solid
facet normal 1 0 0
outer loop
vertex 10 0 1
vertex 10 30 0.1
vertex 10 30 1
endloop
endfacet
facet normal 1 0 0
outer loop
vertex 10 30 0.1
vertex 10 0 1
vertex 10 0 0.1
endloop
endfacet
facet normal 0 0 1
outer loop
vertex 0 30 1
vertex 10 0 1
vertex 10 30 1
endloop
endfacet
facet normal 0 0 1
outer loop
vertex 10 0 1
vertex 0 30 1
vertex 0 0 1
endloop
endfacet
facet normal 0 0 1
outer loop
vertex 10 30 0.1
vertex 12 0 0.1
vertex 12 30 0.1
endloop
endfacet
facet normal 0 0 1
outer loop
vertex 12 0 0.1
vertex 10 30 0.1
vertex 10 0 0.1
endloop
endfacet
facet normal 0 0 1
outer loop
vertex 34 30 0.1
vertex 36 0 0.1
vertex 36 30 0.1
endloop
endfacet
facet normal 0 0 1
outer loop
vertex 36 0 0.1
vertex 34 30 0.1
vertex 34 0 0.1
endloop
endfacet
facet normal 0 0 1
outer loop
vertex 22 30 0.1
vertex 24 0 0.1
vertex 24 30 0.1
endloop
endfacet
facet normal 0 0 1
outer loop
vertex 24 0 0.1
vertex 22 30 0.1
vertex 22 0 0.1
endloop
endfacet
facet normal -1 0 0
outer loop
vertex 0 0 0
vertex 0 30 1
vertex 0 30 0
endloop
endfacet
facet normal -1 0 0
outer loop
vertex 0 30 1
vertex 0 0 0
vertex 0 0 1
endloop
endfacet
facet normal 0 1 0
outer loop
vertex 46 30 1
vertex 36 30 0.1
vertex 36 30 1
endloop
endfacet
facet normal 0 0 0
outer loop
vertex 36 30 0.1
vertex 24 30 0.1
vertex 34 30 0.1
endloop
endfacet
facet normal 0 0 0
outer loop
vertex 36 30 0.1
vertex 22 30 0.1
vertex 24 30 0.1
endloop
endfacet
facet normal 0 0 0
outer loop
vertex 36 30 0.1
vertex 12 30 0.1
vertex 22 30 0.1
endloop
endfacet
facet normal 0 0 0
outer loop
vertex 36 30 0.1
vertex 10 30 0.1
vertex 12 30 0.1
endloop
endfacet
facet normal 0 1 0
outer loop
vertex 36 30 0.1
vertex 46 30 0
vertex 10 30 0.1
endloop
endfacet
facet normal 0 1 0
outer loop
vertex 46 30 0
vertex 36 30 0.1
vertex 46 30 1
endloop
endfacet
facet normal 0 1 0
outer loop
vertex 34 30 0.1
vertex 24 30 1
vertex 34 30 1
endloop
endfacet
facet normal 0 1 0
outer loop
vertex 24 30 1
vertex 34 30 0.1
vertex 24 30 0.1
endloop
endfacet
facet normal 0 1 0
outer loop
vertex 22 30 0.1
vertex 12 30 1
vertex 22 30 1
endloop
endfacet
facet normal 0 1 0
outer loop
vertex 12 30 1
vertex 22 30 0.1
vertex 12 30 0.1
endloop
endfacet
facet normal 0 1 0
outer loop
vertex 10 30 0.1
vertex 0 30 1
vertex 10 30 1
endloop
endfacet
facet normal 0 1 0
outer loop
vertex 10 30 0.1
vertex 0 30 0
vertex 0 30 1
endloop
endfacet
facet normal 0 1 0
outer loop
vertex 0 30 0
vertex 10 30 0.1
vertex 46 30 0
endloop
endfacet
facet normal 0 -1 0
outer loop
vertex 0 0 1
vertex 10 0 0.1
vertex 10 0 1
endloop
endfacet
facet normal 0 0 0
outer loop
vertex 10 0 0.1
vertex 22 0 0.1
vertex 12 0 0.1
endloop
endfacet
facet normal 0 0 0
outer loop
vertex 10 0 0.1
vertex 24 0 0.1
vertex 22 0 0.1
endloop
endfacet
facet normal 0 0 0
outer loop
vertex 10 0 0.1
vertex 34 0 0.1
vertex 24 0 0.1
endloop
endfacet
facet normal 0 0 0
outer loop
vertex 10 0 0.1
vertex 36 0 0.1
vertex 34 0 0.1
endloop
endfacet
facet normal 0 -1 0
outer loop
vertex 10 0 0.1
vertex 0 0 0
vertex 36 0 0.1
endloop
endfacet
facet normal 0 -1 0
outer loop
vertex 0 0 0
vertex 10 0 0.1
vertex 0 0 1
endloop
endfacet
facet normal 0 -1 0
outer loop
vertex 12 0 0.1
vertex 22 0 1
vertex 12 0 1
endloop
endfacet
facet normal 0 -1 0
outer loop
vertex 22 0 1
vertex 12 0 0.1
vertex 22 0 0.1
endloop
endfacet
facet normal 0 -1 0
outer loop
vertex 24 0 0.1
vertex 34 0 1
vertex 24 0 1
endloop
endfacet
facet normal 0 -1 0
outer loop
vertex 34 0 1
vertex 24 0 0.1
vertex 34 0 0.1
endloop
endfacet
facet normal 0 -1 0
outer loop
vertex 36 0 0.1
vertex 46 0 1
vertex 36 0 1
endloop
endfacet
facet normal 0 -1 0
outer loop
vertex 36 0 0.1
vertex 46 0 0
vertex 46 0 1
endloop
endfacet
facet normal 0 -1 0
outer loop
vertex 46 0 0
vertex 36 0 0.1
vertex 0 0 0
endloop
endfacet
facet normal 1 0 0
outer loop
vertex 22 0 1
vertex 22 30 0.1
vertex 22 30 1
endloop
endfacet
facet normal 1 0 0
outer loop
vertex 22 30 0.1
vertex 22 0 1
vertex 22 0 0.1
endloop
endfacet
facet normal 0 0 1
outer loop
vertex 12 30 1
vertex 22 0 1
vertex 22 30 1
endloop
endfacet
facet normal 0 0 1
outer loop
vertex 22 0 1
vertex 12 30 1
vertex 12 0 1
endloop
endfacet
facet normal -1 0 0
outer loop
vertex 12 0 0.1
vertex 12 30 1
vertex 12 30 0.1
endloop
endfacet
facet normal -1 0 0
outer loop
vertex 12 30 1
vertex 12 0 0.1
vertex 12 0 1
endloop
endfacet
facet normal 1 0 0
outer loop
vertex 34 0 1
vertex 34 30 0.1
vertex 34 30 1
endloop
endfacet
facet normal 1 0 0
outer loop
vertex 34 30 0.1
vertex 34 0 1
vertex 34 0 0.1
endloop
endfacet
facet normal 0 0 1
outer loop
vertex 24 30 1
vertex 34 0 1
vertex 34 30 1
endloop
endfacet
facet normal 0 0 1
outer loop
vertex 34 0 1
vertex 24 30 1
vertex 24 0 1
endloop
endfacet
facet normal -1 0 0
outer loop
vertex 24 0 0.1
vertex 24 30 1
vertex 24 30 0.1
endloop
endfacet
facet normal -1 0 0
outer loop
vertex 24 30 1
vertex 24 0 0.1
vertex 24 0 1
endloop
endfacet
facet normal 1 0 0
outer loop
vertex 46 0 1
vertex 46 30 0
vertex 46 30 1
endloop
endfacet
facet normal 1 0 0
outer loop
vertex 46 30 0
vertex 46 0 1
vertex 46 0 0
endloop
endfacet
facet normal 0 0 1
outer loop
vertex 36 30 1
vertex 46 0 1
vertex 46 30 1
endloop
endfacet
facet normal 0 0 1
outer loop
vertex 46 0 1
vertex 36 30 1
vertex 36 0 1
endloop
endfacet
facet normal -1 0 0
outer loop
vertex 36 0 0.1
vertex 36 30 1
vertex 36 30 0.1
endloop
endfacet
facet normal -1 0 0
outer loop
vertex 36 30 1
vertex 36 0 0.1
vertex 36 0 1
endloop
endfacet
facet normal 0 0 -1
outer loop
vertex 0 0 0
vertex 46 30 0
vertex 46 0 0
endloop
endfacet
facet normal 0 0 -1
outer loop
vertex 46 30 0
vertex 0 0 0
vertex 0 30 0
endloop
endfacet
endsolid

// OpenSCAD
// Goal: test a variety of flexible surfaces to hopefully enable
//       boxes that unfold for use in-game

// Generates an unfurled prism where thicker sections of the material
// are the walls and the thinner sections are the joinery
module flexibox(
  wall_length,
  wall_width,
  layer_height,
  base_layer_count,
  wall_layer_count, // doesn't count the base layers
  distance_between_walls // hinge length
) {
  cube([
    wall_width * 4 + distance_between_walls * 3,
    wall_length,
    layer_height * base_layer_count
  ]);
  for (i = [0 : 3]) {
    translate([
      i * (wall_width + distance_between_walls),
      0,
      layer_height * base_layer_count
    ])
      cube([
        wall_width,
        wall_length,
        layer_height * wall_layer_count
      ]);
  }
}

flexibox(
  wall_length = 30,
  wall_width = 10,
  layer_height = 0.1,
  base_layer_count = 1,
  wall_layer_count = 9,
  distance_between_walls = 2
);
